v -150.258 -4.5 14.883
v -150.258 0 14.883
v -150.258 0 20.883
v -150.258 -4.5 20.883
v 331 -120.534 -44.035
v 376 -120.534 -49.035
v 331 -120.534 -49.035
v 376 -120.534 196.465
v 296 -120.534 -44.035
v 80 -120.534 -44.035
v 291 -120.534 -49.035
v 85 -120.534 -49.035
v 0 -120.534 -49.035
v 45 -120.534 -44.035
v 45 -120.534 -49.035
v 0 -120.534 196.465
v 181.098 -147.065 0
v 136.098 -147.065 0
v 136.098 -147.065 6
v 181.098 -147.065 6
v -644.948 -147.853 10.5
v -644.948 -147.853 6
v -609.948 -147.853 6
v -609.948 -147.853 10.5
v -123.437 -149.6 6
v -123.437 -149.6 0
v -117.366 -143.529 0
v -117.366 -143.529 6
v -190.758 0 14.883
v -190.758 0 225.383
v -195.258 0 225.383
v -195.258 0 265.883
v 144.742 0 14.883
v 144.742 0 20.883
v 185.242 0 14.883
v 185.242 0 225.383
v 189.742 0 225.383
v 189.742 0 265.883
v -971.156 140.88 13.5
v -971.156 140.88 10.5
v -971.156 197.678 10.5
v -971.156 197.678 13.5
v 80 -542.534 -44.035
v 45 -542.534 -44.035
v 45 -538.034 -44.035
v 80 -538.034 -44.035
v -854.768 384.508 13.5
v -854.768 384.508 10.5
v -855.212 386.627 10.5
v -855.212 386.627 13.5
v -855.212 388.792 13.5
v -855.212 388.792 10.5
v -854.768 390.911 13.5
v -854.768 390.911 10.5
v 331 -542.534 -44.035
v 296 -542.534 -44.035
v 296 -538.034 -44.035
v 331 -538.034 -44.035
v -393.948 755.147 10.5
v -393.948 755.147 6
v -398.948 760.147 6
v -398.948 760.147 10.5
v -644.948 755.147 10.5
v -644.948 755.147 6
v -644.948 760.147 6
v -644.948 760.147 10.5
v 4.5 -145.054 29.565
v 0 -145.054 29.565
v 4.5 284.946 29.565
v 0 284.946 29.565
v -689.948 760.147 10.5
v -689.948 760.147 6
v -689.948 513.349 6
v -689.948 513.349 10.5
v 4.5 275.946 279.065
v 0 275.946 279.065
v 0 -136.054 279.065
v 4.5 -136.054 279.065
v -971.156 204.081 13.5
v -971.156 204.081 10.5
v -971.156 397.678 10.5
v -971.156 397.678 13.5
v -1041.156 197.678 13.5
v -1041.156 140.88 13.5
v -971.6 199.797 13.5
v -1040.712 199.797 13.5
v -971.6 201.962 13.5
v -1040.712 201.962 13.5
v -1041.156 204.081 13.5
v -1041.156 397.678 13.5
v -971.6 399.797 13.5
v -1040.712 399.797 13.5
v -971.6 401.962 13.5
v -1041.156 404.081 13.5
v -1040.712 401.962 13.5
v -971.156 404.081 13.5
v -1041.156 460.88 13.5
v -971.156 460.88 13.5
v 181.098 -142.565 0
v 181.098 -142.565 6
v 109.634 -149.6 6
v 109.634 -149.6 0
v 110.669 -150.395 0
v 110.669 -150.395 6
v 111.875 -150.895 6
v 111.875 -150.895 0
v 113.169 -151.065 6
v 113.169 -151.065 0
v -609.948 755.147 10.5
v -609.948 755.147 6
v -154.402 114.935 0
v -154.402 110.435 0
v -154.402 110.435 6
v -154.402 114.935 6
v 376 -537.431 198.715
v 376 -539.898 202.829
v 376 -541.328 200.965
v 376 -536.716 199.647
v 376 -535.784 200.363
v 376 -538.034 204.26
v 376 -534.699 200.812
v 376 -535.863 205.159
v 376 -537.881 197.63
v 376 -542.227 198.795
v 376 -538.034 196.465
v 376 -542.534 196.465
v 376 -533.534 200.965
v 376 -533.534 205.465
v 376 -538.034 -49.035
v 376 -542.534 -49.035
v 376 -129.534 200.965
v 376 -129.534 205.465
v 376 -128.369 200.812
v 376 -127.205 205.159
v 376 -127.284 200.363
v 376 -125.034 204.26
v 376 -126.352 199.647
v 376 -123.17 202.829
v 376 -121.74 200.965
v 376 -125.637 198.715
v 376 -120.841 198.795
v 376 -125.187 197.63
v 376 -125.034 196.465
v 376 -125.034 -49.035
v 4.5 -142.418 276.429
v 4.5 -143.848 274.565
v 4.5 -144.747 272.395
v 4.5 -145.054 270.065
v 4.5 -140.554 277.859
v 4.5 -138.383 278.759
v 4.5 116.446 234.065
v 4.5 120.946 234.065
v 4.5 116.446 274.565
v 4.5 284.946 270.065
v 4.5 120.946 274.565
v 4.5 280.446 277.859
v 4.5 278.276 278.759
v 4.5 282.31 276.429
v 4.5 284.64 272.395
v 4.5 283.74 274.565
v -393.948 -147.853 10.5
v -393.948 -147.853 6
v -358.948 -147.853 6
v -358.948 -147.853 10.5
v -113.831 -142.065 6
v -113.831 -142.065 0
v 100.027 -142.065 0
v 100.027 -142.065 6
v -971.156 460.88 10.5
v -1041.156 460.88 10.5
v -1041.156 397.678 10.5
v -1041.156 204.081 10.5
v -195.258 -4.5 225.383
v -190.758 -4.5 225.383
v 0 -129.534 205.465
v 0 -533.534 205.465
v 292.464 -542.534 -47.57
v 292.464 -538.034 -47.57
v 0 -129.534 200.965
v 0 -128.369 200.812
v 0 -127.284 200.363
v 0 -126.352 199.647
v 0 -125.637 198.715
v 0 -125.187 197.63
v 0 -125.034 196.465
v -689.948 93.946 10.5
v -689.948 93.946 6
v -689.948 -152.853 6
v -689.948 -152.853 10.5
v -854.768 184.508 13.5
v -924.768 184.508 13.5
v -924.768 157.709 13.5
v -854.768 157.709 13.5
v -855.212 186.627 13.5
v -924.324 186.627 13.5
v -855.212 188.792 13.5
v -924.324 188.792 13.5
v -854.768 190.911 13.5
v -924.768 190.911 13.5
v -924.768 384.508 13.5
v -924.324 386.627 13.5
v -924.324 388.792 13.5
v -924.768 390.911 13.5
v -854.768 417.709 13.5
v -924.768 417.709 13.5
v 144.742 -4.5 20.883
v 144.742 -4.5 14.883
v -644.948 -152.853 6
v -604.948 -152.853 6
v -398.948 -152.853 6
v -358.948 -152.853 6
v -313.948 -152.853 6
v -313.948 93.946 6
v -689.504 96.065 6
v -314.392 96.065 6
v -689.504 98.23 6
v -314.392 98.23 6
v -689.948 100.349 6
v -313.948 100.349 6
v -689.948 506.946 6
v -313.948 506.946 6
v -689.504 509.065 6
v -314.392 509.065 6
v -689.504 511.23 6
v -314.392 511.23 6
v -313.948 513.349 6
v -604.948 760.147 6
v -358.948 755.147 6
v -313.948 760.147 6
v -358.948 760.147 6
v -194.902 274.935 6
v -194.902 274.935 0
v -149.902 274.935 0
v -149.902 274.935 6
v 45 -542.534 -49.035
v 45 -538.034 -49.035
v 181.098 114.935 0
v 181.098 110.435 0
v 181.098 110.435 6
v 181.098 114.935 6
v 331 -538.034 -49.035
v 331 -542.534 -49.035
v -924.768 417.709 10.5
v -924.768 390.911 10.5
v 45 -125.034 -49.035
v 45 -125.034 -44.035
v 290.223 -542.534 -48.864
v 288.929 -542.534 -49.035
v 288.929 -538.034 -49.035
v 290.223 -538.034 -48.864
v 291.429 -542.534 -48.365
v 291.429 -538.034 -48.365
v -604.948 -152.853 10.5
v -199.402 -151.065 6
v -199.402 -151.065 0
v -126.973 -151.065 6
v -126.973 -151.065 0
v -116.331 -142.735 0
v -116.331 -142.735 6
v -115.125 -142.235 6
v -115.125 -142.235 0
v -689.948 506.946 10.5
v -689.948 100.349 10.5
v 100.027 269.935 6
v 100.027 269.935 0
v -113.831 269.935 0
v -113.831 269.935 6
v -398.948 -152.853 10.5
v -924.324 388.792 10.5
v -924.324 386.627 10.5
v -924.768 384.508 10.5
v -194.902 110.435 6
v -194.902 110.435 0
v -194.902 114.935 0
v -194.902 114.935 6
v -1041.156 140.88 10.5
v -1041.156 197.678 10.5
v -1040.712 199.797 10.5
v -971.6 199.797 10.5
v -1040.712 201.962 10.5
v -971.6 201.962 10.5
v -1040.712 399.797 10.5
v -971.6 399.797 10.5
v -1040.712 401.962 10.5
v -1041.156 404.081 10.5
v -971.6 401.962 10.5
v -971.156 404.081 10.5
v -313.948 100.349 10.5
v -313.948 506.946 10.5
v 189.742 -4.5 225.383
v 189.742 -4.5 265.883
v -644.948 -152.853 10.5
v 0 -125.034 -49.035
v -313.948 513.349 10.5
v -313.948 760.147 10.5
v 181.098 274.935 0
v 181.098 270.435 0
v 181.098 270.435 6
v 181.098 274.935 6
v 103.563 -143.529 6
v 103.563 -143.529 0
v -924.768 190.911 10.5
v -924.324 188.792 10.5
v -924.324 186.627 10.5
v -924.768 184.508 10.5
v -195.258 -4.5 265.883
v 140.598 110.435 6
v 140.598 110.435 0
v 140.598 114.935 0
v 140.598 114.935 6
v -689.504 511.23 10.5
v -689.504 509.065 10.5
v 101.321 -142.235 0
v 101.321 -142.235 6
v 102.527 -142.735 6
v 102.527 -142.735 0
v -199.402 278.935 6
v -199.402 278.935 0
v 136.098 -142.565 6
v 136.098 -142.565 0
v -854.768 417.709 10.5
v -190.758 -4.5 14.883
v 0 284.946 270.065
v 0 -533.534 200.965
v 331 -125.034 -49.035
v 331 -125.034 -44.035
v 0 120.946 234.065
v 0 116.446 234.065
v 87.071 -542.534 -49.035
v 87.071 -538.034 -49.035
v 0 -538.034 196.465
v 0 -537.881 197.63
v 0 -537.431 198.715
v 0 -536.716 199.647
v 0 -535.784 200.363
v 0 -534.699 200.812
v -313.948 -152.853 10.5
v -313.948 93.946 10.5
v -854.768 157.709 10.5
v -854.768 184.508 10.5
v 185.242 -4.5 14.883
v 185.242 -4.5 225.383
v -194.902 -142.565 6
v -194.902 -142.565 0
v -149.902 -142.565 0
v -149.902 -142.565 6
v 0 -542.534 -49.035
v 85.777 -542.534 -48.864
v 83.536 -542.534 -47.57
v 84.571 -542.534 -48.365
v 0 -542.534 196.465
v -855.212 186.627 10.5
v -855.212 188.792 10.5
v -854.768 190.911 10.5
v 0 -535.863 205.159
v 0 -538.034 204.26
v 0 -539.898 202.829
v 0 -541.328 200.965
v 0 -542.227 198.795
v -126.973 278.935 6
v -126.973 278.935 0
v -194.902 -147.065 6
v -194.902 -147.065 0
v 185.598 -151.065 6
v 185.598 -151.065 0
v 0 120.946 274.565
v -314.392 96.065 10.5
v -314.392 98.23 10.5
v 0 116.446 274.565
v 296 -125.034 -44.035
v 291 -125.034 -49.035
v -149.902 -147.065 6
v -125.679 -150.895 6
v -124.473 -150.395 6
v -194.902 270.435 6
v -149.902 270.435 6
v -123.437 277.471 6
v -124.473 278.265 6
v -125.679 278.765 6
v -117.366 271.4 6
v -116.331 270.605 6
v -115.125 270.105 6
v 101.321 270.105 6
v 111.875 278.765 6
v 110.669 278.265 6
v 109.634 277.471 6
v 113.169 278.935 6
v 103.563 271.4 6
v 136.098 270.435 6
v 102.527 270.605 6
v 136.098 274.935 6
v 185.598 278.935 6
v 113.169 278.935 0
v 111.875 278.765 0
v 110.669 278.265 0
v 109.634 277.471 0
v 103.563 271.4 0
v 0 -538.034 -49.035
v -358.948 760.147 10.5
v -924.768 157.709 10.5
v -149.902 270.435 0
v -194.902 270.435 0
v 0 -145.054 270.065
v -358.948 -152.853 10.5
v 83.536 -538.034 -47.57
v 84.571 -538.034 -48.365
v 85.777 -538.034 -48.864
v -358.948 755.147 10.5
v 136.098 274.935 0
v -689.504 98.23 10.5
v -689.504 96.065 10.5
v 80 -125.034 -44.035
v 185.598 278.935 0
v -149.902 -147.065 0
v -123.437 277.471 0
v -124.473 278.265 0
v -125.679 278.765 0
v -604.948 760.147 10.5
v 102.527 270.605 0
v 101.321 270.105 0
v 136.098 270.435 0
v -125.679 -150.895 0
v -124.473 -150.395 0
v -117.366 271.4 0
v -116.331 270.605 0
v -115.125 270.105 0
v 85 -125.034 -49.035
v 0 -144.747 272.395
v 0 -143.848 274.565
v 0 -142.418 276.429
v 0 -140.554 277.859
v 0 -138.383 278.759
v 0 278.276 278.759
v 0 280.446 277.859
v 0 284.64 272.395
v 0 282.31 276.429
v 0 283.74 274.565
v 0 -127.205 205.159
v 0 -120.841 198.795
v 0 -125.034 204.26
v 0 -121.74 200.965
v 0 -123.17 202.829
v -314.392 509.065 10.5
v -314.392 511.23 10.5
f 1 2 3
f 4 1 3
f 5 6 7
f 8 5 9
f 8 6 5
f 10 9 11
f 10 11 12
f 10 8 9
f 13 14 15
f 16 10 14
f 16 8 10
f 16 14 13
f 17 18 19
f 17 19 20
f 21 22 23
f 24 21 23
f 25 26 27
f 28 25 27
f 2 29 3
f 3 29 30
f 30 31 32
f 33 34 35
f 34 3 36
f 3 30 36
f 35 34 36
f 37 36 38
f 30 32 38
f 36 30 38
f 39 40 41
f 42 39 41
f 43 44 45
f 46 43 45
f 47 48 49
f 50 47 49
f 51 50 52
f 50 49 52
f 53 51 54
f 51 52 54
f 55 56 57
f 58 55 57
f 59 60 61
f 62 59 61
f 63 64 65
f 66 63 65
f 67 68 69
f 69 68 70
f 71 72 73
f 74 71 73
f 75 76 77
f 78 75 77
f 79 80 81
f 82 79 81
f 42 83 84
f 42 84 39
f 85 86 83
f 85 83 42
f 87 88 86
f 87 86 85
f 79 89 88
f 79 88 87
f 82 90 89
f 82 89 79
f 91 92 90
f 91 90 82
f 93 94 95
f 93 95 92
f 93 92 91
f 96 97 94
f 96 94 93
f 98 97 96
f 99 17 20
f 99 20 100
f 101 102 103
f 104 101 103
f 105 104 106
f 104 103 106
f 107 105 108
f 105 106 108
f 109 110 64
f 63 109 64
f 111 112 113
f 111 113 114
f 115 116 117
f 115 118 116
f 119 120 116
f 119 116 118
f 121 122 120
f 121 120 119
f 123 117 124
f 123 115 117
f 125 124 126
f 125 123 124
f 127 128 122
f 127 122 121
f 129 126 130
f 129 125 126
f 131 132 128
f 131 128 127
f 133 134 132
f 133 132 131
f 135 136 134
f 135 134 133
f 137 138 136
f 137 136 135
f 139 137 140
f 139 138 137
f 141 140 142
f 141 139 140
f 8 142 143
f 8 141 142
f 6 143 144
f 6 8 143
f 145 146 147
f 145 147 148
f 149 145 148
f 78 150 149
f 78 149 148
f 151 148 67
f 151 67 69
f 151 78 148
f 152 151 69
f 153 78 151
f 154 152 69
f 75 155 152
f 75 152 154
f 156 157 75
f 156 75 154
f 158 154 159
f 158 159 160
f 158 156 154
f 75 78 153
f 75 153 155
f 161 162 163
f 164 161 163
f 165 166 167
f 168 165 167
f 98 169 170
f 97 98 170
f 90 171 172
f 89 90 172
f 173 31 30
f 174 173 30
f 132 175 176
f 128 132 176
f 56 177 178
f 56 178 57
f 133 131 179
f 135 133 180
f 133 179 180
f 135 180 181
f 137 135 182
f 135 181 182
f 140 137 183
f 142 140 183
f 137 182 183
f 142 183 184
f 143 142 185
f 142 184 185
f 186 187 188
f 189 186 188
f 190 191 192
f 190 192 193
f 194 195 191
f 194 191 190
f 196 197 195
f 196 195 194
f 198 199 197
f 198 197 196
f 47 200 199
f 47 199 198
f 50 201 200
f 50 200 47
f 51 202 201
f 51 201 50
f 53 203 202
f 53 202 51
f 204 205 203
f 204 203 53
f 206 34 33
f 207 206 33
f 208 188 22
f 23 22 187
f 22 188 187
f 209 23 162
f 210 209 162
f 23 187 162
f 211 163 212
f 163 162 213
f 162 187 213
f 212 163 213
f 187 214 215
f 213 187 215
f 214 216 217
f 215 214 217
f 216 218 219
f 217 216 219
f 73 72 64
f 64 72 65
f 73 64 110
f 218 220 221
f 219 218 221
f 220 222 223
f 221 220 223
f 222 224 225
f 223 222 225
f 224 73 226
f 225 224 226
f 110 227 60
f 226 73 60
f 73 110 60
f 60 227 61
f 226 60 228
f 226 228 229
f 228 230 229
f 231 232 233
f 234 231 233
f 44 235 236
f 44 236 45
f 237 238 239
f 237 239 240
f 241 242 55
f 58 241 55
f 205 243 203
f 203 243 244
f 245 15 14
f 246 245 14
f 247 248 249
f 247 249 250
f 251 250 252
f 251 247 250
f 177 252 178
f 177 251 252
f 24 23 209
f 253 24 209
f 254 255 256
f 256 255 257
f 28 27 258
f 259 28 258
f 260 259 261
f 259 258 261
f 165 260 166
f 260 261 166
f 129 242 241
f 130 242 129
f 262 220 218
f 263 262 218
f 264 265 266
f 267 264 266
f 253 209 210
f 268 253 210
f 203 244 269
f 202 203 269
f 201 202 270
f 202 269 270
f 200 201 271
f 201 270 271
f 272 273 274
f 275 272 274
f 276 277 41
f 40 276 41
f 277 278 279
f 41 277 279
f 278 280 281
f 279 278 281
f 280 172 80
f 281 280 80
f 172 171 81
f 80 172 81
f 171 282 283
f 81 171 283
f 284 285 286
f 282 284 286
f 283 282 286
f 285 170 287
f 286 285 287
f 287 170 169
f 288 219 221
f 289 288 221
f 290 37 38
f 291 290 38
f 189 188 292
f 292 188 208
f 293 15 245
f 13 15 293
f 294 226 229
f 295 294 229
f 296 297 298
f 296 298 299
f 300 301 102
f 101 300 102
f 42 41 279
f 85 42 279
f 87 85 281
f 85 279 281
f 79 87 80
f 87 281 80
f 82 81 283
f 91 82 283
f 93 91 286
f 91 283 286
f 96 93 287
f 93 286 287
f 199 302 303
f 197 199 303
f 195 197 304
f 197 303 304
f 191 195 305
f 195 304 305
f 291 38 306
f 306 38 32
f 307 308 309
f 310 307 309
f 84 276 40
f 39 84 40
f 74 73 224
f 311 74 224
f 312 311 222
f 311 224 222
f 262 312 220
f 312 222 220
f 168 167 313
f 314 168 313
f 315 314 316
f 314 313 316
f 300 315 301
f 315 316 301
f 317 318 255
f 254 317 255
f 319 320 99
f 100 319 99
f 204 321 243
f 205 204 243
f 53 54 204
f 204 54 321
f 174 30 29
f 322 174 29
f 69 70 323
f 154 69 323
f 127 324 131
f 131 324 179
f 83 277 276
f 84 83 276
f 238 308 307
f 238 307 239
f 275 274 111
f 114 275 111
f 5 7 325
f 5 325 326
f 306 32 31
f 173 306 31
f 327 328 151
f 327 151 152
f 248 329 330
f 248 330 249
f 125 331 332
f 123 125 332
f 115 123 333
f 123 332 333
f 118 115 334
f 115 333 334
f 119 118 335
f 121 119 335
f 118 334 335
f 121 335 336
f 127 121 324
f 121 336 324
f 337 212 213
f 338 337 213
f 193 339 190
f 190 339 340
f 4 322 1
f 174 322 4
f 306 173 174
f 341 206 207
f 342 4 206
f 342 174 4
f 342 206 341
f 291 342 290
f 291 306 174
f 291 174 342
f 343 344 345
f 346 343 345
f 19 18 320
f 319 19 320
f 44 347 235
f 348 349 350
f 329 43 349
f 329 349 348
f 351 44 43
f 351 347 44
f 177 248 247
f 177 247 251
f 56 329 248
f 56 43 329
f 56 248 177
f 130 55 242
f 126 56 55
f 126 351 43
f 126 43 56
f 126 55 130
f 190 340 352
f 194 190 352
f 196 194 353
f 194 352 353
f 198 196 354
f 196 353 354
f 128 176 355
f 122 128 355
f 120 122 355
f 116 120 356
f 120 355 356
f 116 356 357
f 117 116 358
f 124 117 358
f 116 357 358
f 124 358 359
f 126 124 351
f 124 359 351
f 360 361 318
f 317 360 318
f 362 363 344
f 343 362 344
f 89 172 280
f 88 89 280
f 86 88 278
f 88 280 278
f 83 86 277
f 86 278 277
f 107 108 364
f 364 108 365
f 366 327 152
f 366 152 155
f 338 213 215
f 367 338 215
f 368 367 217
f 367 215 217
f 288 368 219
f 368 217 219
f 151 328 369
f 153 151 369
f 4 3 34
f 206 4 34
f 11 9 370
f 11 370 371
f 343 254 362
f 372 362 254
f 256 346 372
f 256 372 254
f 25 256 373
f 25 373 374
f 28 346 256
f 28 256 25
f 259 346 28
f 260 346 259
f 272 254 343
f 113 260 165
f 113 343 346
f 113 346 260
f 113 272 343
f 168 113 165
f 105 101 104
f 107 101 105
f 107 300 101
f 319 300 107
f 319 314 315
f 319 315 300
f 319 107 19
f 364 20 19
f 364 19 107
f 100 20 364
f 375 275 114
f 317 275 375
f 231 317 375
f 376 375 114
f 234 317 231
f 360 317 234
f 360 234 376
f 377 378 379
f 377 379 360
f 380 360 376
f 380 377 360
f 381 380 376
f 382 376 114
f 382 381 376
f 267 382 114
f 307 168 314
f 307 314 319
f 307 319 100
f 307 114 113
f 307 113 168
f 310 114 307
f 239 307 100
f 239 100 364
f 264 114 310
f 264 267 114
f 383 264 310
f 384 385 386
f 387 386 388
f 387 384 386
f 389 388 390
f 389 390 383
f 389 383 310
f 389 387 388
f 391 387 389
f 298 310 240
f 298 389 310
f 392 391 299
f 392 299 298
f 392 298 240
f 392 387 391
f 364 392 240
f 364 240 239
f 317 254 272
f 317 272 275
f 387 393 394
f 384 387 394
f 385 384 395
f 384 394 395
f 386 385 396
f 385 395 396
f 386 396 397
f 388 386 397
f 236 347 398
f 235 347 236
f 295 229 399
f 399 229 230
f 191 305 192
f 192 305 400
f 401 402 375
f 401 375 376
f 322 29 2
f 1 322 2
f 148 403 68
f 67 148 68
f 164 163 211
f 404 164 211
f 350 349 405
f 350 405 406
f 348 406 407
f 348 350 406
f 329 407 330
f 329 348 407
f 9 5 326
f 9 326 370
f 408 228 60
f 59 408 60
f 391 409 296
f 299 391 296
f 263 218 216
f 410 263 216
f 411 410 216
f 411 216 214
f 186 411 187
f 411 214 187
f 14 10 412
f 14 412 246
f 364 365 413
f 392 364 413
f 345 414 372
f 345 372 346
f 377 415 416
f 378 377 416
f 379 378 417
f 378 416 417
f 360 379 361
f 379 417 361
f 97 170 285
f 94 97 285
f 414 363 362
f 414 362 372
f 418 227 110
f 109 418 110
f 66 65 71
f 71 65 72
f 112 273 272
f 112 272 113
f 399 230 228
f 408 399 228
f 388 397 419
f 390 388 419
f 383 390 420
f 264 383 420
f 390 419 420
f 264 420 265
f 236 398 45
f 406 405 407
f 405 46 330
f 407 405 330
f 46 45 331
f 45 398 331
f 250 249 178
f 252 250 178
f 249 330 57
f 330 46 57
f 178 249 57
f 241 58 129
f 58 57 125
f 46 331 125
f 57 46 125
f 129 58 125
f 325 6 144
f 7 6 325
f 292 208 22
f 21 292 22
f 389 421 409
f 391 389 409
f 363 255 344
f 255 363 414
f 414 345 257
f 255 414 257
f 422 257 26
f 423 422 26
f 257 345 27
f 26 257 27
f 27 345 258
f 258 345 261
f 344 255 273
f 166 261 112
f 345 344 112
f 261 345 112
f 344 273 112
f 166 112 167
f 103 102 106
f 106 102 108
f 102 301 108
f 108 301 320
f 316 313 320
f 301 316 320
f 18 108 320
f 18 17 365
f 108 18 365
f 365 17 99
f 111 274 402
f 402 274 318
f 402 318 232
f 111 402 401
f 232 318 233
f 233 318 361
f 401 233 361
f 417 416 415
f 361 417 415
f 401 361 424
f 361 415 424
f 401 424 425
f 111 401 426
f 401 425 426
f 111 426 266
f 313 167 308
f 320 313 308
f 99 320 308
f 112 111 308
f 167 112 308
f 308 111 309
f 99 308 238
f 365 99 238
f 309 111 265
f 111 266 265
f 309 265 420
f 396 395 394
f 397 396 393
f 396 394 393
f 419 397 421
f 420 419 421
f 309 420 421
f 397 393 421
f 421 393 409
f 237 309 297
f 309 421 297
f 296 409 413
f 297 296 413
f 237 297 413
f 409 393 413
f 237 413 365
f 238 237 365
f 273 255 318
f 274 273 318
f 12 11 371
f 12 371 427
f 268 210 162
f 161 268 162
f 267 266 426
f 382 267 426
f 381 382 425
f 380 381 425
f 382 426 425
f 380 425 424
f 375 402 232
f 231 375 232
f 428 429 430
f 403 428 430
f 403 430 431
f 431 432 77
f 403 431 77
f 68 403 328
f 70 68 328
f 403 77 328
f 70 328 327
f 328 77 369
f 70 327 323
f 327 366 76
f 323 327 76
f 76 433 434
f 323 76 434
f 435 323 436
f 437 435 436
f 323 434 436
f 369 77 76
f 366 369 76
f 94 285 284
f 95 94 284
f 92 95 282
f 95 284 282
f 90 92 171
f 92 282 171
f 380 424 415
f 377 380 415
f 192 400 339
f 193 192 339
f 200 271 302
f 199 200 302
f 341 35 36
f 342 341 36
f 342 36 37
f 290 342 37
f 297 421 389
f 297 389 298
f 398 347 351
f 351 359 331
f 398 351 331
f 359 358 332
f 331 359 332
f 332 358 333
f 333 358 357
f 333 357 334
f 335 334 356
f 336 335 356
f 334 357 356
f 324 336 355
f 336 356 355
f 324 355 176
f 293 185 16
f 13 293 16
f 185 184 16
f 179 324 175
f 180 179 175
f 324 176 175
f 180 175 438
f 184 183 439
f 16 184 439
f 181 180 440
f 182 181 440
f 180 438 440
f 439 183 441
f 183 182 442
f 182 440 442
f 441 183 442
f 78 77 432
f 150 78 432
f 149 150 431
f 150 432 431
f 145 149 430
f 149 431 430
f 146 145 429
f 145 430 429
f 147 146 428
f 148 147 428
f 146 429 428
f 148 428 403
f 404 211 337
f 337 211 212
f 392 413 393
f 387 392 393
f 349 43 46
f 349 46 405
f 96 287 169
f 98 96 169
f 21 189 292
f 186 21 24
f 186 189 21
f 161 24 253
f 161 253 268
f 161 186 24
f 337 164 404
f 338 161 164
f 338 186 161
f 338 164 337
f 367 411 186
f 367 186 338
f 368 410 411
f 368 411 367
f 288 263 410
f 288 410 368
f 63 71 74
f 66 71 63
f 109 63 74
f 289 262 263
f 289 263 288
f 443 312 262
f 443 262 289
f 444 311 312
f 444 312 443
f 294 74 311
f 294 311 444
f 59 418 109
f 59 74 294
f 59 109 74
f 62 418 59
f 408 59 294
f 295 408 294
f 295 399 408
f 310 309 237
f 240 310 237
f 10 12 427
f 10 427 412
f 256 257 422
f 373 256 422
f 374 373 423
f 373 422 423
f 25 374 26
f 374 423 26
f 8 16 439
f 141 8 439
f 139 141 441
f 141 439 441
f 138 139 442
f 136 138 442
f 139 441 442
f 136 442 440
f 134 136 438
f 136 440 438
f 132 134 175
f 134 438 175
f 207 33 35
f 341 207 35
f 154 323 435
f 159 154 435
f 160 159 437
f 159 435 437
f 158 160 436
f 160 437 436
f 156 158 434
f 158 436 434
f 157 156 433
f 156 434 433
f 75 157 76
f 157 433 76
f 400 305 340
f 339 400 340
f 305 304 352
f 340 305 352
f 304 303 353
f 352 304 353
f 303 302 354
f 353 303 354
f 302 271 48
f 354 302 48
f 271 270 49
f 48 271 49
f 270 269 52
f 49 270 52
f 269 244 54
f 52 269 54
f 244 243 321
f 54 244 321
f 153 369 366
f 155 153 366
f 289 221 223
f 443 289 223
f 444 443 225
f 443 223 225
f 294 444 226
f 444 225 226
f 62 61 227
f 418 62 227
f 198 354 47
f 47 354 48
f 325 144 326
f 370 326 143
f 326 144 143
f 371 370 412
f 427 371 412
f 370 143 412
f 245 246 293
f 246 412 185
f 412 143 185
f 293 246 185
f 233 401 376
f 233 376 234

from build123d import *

# Parameters (mm, degrees)
F0_W      = 45
F0_H      = 4.5
F0_W_2    = 40.5
F1_DEPTH  = 6
F3_DEPTH  = 4.5
F4_W      = 4.5
F4_H      = 40.5
F5_DEPTH  = 4.5
F7_DEPTH  = 376
F8_W      = 45
F8_H      = 5
F9_DEPTH  = 4.5
F10_W     = 45
F10_H     = 5
F11_DEPTH = 4.5
F13_DEPTH = 4.5
F15_DEPTH = 3
F17_DEPTH = 3


with BuildPart() as f1:
    # F0 (on Top) → F1 (new body)
    with BuildSketch(Plane.XY):
        with BuildLine():
            Line((-199.4017629046, 110.4350739238), (-199.4017629046, -151.0649260762))
            Line((-199.4017629046, -151.0649260762), (-126.9728307165, -151.0649260762))
            ThreePointArc((-126.9728307165, -151.0649260762), (-125.0594135547, -150.6843237388), (-123.4372968106, -149.6004599821))
            Line((-123.4372968106, -149.6004599821), (-117.3662289987, -143.5293921703))
            ThreePointArc((-117.3662289987, -143.5293921703), (-115.7441122546, -142.4455284136), (-113.8306950928, -142.0649260762))
            Line((-113.8306950928, -142.0649260762), (100.0271692835, -142.0649260762))
            ThreePointArc((100.0271692835, -142.0649260762), (101.9405864453, -142.4455284136), (103.5627031894, -143.5293921703))
            Line((103.5627031894, -143.5293921703), (109.6337710013, -149.6004599821))
            ThreePointArc((109.6337710013, -149.6004599821), (111.2558877454, -150.6843237388), (113.1693049072, -151.0649260762))
            Line((113.1693049072, -151.0649260762), (185.5982370954, -151.0649260762))
            Line((185.5982370954, -151.0649260762), (185.5982370954, 110.4350739238))
            Line((185.5982370954, 110.4350739238), (185.5982370954, 114.9350739238))
            Line((185.5982370954, 114.9350739238), (185.5982370954, 278.9350739238))
            Line((185.5982370954, 278.9350739238), (113.1693049072, 278.9350739238))
            ThreePointArc((113.1693049072, 278.9350739238), (111.2558877454, 278.5544715864), (109.6337710013, 277.4706078297))
            Line((109.6337710013, 277.4706078297), (103.5627031894, 271.3995400179))
            ThreePointArc((103.5627031894, 271.3995400179), (101.9405864453, 270.3156762612), (100.0271692835, 269.9350739238))
            Line((100.0271692835, 269.9350739238), (-113.8306950928, 269.9350739238))
            ThreePointArc((-113.8306950928, 269.9350739238), (-115.7441122546, 270.3156762612), (-117.3662289987, 271.3995400179))
            Line((-117.3662289987, 271.3995400179), (-123.4372968106, 277.4706078297))
            ThreePointArc((-123.4372968106, 277.4706078297), (-125.0594135547, 278.5544715864), (-126.9728307165, 278.9350739238))
            Line((-126.9728307165, 278.9350739238), (-199.4017629046, 278.9350739238))
            Line((-199.4017629046, 278.9350739238), (-199.4017629046, 114.9350739238))
            Line((-199.4017629046, 114.9350739238), (-199.4017629046, 110.4350739238))
        make_face()
        with Locations((-172.4017629046, -144.8149260762)):
            Rectangle(F0_W, F0_H, mode=Mode.SUBTRACT)
        with Locations((158.5982370954, -144.8149260762)):
            Rectangle(F0_W, F0_H, mode=Mode.SUBTRACT)
        with Locations((-174.6517629046, 112.6850739238)):
            Rectangle(F0_W_2, F0_H, mode=Mode.SUBTRACT)
        with Locations((-172.4017629046, 272.6850739238)):
            Rectangle(F0_W, F0_H, mode=Mode.SUBTRACT)
        with Locations((160.8482370954, 112.6850739238)):
            Rectangle(F0_W_2, F0_H, mode=Mode.SUBTRACT)
        with Locations((158.5982370954, 272.6850739238)):
            Rectangle(F0_W, F0_H, mode=Mode.SUBTRACT)
    extrude(amount=F1_DEPTH)


with BuildPart() as f3:
    # F2 (on Front) → F3 (new body)
    with BuildSketch(Plane.XZ):
        Polygon((-150.2581751347, 14.8828048706), (-150.2581751347, 20.8828048706), (144.7418248653, 20.8828048706), (144.7418248653, 14.8828048706), (185.2418248653, 14.8828048706), (185.2418248653, 20.8828048706), (185.2418248653, 225.3828048706), (189.7418248653, 225.3828048706), (189.7418248653, 265.8828048706), (185.2418248653, 265.8828048706), (-190.7581751347, 265.8828048706), (-195.2581751347, 265.8828048706), (-195.2581751347, 225.3828048706), (-190.7581751347, 225.3828048706), (-190.7581751347, 20.8828048706), (-190.7581751347, 14.8828048706), align=None)
    extrude(amount=F3_DEPTH)


with BuildPart() as f5:
    # F4 (on Right) → F5 (new body)
    with BuildSketch(Plane.YZ):
        with BuildLine():
            Line((-145.0537979603, 270.0652094391), (-145.0537979603, 29.5652094391))
            Line((-145.0537979603, 29.5652094391), (284.9462020397, 29.5652094391))
            Line((284.9462020397, 29.5652094391), (284.9462020397, 270.0652094391))
            ThreePointArc((284.9462020397, 270.0652094391), (282.3101630704, 276.4291704698), (275.9462020397, 279.0652094391))
            Line((275.9462020397, 279.0652094391), (120.9462020397, 279.0652094391))
            Line((120.9462020397, 279.0652094391), (116.4462020397, 279.0652094391))
            Line((116.4462020397, 279.0652094391), (-136.0537979603, 279.0652094391))
            ThreePointArc((-136.0537979603, 279.0652094391), (-142.417758991, 276.4291704698), (-145.0537979603, 270.0652094391))
        make_face()
        with Locations((118.6962020397, 254.3152094391)):
            Rectangle(F4_W, F4_H, mode=Mode.SUBTRACT)
    extrude(amount=F5_DEPTH)


with BuildPart() as f7:
    # F6 (on Right) → F7 (new body)
    with BuildSketch(Plane.YZ):
        with BuildLine():
            Line((-125.0340768695, -44.0345209837), (-120.5340768695, -44.0345209837))
            Line((-120.5340768695, -44.0345209837), (-120.5340768695, 196.4654790163))
            ThreePointArc((-120.5340768695, 196.4654790163), (-123.1701158388, 202.829440047), (-129.5340768695, 205.4654790163))
            Line((-129.5340768695, 205.4654790163), (-533.5340768695, 205.4654790163))
            ThreePointArc((-533.5340768695, 205.4654790163), (-539.8980379002, 202.829440047), (-542.5340768695, 196.4654790163))
            Line((-542.5340768695, 196.4654790163), (-542.5340768695, -44.0345209837))
            Line((-542.5340768695, -44.0345209837), (-538.0340768695, -44.0345209837))
            Line((-538.0340768695, -44.0345209837), (-538.0340768695, 196.4654790163))
            ThreePointArc((-538.0340768695, 196.4654790163), (-536.7160573848, 199.6474595316), (-533.5340768695, 200.9654790163))
            Line((-533.5340768695, 200.9654790163), (-129.5340768695, 200.9654790163))
            ThreePointArc((-129.5340768695, 200.9654790163), (-126.3520963541, 199.6474595316), (-125.0340768695, 196.4654790163))
            Line((-125.0340768695, 196.4654790163), (-125.0340768695, -44.0345209837))
        make_face()
    extrude(amount=F7_DEPTH)

    # F8 (on face) → F9 (join)
    with BuildSketch(Plane.XZ.offset(542.5340768695)):
        with BuildLine():
            Line((80, -44.0345209837), (83.5355339059, -47.5700548896))
            ThreePointArc((83.5355339059, -47.5700548896), (85.15765065, -48.6539186463), (87.0710678119, -49.0345209837))
            Line((87.0710678119, -49.0345209837), (288.9289321881, -49.0345209837))
            ThreePointArc((288.9289321881, -49.0345209837), (290.84234935, -48.6539186463), (292.4644660941, -47.5700548896))
            Line((292.4644660941, -47.5700548896), (296, -44.0345209837))
            Line((296, -44.0345209837), (80, -44.0345209837))
        make_face()
        with Locations((353.5, -46.5345209837)):
            Rectangle(F8_W, F8_H)
        with Locations((22.5, -46.5345209837)):
            Rectangle(F8_W, F8_H)
    extrude(amount=-F9_DEPTH)

    # F10 (on face) → F11 (join)
    with BuildSketch(Plane(origin=(0, -120.5340768695, 0), x_dir=(-1, 0, 0), z_dir=(0, 1, 0))):
        with Locations((-353.5, -46.5345209837)):
            Rectangle(F10_W, F10_H)
        with Locations((-22.5, -46.5345209837)):
            Rectangle(F10_W, F10_H)
        Polygon((-80, -44.0345209837), (-296, -44.0345209837), (-291, -49.0345209837), (-85, -49.0345209837), align=None)
        Polygon((-376, 196.4654790163), (-376, -44.0345209837), (-331, -44.0345209837), (-296, -44.0345209837), (-80, -44.0345209837), (-45, -44.0345209837), (0, -44.0345209837), (0, 196.4654790163), align=None)
    extrude(amount=-F11_DEPTH)


with BuildPart() as f13:
    # F12 (on face) → F13 (new body)
    with BuildSketch(Plane.XY.offset(6)):
        with BuildLine():
            Line((-689.9478515867, 93.9458254219), (-689.9478515867, -152.8526124594))
            Line((-689.9478515867, -152.8526124594), (-644.9478515867, -152.8526124594))
            Line((-644.9478515867, -152.8526124594), (-644.9478515867, -147.8526124594))
            Line((-644.9478515867, -147.8526124594), (-609.9478515867, -147.8526124594))
            Line((-609.9478515867, -147.8526124594), (-604.9478515867, -152.8526124594))
            Line((-604.9478515867, -152.8526124594), (-398.9478515867, -152.8526124594))
            Line((-398.9478515867, -152.8526124594), (-393.9478515867, -147.8526124594))
            Line((-393.9478515867, -147.8526124594), (-358.9478515867, -147.8526124594))
            Line((-358.9478515867, -147.8526124594), (-358.9478515867, -152.8526124594))
            Line((-358.9478515867, -152.8526124594), (-313.9478515867, -152.8526124594))
            Line((-313.9478515867, -152.8526124594), (-313.9478515867, 93.9458254219))
            ThreePointArc((-313.9478515867, 93.9458254219), (-314.4478515867, 97.1473875406), (-313.9478515867, 100.3489496594))
            Line((-313.9478515867, 100.3489496594), (-313.9478515867, 506.9458254219))
            ThreePointArc((-313.9478515867, 506.9458254219), (-314.4478515867, 510.1473875406), (-313.9478515867, 513.3489496594))
            Line((-313.9478515867, 513.3489496594), (-313.9478515867, 760.1473875406))
            Line((-313.9478515867, 760.1473875406), (-358.9478515867, 760.1473875406))
            Line((-358.9478515867, 760.1473875406), (-358.9478515867, 755.1473875406))
            Line((-358.9478515867, 755.1473875406), (-393.9478515867, 755.1473875406))
            Line((-393.9478515867, 755.1473875406), (-398.9478515867, 760.1473875406))
            Line((-398.9478515867, 760.1473875406), (-604.9478515867, 760.1473875406))
            Line((-604.9478515867, 760.1473875406), (-609.9478515867, 755.1473875406))
            Line((-609.9478515867, 755.1473875406), (-644.9478515867, 755.1473875406))
            Line((-644.9478515867, 755.1473875406), (-644.9478515867, 760.1473875406))
            Line((-644.9478515867, 760.1473875406), (-689.9478515867, 760.1473875406))
            Line((-689.9478515867, 760.1473875406), (-689.9478515867, 513.3489496594))
            ThreePointArc((-689.9478515867, 513.3489496594), (-689.4478515867, 510.1473875406), (-689.9478515867, 506.9458254219))
            Line((-689.9478515867, 506.9458254219), (-689.9478515867, 100.3489496594))
            ThreePointArc((-689.9478515867, 100.3489496594), (-689.4478515867, 97.1473875406), (-689.9478515867, 93.9458254219))
        make_face()
    extrude(amount=F13_DEPTH)


with BuildPart() as f15:
    # F14 (on face) → F15 (new body)
    with BuildSketch(Plane.XY.offset(10.5)):
        with BuildLine():
            Line((-854.768217802, 417.7094859497), (-924.768217802, 417.7094859497))
            Line((-924.768217802, 417.7094859497), (-924.768217802, 390.9110480684))
            ThreePointArc((-924.768217802, 390.9110480684), (-924.268217802, 387.7094859497), (-924.768217802, 384.507923831))
            Line((-924.768217802, 384.507923831), (-924.768217802, 190.9110480684))
            ThreePointArc((-924.768217802, 190.9110480684), (-924.268217802, 187.7094859497), (-924.768217802, 184.507923831))
            Line((-924.768217802, 184.507923831), (-924.768217802, 157.7094859497))
            Line((-924.768217802, 157.7094859497), (-854.768217802, 157.7094859497))
            Line((-854.768217802, 157.7094859497), (-854.768217802, 184.507923831))
            ThreePointArc((-854.768217802, 184.507923831), (-855.268217802, 187.7094859497), (-854.768217802, 190.9110480684))
            Line((-854.768217802, 190.9110480684), (-854.768217802, 384.507923831))
            ThreePointArc((-854.768217802, 384.507923831), (-855.268217802, 387.7094859497), (-854.768217802, 390.9110480684))
            Line((-854.768217802, 390.9110480684), (-854.768217802, 417.7094859497))
        make_face()
    extrude(amount=F15_DEPTH)


with BuildPart() as f17:
    # F16 (on face) → F17 (new body)
    with BuildSketch(Plane.XY.offset(10.5)):
        with BuildLine():
            Line((-971.1563087912, 460.8797235596), (-1041.1563087912, 460.8797235596))
            Line((-1041.1563087912, 460.8797235596), (-1041.1563087912, 404.0812856783))
            ThreePointArc((-1041.1563087912, 404.0812856783), (-1040.6563087912, 400.8797235596), (-1041.1563087912, 397.6781614409))
            Line((-1041.1563087912, 397.6781614409), (-1041.1563087912, 204.0812856783))
            ThreePointArc((-1041.1563087912, 204.0812856783), (-1040.6563087912, 200.8797235596), (-1041.1563087912, 197.6781614409))
            Line((-1041.1563087912, 197.6781614409), (-1041.1563087912, 140.8797235596))
            Line((-1041.1563087912, 140.8797235596), (-971.1563087912, 140.8797235596))
            Line((-971.1563087912, 140.8797235596), (-971.1563087912, 197.6781614409))
            ThreePointArc((-971.1563087912, 197.6781614409), (-971.6563087912, 200.8797235596), (-971.1563087912, 204.0812856783))
            Line((-971.1563087912, 204.0812856783), (-971.1563087912, 397.6781614409))
            ThreePointArc((-971.1563087912, 397.6781614409), (-971.6563087912, 400.8797235596), (-971.1563087912, 404.0812856783))
            Line((-971.1563087912, 404.0812856783), (-971.1563087912, 460.8797235596))
        make_face()
    extrude(amount=F17_DEPTH)


solid = Compound([f1.part, f3.part, f5.part, f7.part, f13.part, f15.part, f17.part])
